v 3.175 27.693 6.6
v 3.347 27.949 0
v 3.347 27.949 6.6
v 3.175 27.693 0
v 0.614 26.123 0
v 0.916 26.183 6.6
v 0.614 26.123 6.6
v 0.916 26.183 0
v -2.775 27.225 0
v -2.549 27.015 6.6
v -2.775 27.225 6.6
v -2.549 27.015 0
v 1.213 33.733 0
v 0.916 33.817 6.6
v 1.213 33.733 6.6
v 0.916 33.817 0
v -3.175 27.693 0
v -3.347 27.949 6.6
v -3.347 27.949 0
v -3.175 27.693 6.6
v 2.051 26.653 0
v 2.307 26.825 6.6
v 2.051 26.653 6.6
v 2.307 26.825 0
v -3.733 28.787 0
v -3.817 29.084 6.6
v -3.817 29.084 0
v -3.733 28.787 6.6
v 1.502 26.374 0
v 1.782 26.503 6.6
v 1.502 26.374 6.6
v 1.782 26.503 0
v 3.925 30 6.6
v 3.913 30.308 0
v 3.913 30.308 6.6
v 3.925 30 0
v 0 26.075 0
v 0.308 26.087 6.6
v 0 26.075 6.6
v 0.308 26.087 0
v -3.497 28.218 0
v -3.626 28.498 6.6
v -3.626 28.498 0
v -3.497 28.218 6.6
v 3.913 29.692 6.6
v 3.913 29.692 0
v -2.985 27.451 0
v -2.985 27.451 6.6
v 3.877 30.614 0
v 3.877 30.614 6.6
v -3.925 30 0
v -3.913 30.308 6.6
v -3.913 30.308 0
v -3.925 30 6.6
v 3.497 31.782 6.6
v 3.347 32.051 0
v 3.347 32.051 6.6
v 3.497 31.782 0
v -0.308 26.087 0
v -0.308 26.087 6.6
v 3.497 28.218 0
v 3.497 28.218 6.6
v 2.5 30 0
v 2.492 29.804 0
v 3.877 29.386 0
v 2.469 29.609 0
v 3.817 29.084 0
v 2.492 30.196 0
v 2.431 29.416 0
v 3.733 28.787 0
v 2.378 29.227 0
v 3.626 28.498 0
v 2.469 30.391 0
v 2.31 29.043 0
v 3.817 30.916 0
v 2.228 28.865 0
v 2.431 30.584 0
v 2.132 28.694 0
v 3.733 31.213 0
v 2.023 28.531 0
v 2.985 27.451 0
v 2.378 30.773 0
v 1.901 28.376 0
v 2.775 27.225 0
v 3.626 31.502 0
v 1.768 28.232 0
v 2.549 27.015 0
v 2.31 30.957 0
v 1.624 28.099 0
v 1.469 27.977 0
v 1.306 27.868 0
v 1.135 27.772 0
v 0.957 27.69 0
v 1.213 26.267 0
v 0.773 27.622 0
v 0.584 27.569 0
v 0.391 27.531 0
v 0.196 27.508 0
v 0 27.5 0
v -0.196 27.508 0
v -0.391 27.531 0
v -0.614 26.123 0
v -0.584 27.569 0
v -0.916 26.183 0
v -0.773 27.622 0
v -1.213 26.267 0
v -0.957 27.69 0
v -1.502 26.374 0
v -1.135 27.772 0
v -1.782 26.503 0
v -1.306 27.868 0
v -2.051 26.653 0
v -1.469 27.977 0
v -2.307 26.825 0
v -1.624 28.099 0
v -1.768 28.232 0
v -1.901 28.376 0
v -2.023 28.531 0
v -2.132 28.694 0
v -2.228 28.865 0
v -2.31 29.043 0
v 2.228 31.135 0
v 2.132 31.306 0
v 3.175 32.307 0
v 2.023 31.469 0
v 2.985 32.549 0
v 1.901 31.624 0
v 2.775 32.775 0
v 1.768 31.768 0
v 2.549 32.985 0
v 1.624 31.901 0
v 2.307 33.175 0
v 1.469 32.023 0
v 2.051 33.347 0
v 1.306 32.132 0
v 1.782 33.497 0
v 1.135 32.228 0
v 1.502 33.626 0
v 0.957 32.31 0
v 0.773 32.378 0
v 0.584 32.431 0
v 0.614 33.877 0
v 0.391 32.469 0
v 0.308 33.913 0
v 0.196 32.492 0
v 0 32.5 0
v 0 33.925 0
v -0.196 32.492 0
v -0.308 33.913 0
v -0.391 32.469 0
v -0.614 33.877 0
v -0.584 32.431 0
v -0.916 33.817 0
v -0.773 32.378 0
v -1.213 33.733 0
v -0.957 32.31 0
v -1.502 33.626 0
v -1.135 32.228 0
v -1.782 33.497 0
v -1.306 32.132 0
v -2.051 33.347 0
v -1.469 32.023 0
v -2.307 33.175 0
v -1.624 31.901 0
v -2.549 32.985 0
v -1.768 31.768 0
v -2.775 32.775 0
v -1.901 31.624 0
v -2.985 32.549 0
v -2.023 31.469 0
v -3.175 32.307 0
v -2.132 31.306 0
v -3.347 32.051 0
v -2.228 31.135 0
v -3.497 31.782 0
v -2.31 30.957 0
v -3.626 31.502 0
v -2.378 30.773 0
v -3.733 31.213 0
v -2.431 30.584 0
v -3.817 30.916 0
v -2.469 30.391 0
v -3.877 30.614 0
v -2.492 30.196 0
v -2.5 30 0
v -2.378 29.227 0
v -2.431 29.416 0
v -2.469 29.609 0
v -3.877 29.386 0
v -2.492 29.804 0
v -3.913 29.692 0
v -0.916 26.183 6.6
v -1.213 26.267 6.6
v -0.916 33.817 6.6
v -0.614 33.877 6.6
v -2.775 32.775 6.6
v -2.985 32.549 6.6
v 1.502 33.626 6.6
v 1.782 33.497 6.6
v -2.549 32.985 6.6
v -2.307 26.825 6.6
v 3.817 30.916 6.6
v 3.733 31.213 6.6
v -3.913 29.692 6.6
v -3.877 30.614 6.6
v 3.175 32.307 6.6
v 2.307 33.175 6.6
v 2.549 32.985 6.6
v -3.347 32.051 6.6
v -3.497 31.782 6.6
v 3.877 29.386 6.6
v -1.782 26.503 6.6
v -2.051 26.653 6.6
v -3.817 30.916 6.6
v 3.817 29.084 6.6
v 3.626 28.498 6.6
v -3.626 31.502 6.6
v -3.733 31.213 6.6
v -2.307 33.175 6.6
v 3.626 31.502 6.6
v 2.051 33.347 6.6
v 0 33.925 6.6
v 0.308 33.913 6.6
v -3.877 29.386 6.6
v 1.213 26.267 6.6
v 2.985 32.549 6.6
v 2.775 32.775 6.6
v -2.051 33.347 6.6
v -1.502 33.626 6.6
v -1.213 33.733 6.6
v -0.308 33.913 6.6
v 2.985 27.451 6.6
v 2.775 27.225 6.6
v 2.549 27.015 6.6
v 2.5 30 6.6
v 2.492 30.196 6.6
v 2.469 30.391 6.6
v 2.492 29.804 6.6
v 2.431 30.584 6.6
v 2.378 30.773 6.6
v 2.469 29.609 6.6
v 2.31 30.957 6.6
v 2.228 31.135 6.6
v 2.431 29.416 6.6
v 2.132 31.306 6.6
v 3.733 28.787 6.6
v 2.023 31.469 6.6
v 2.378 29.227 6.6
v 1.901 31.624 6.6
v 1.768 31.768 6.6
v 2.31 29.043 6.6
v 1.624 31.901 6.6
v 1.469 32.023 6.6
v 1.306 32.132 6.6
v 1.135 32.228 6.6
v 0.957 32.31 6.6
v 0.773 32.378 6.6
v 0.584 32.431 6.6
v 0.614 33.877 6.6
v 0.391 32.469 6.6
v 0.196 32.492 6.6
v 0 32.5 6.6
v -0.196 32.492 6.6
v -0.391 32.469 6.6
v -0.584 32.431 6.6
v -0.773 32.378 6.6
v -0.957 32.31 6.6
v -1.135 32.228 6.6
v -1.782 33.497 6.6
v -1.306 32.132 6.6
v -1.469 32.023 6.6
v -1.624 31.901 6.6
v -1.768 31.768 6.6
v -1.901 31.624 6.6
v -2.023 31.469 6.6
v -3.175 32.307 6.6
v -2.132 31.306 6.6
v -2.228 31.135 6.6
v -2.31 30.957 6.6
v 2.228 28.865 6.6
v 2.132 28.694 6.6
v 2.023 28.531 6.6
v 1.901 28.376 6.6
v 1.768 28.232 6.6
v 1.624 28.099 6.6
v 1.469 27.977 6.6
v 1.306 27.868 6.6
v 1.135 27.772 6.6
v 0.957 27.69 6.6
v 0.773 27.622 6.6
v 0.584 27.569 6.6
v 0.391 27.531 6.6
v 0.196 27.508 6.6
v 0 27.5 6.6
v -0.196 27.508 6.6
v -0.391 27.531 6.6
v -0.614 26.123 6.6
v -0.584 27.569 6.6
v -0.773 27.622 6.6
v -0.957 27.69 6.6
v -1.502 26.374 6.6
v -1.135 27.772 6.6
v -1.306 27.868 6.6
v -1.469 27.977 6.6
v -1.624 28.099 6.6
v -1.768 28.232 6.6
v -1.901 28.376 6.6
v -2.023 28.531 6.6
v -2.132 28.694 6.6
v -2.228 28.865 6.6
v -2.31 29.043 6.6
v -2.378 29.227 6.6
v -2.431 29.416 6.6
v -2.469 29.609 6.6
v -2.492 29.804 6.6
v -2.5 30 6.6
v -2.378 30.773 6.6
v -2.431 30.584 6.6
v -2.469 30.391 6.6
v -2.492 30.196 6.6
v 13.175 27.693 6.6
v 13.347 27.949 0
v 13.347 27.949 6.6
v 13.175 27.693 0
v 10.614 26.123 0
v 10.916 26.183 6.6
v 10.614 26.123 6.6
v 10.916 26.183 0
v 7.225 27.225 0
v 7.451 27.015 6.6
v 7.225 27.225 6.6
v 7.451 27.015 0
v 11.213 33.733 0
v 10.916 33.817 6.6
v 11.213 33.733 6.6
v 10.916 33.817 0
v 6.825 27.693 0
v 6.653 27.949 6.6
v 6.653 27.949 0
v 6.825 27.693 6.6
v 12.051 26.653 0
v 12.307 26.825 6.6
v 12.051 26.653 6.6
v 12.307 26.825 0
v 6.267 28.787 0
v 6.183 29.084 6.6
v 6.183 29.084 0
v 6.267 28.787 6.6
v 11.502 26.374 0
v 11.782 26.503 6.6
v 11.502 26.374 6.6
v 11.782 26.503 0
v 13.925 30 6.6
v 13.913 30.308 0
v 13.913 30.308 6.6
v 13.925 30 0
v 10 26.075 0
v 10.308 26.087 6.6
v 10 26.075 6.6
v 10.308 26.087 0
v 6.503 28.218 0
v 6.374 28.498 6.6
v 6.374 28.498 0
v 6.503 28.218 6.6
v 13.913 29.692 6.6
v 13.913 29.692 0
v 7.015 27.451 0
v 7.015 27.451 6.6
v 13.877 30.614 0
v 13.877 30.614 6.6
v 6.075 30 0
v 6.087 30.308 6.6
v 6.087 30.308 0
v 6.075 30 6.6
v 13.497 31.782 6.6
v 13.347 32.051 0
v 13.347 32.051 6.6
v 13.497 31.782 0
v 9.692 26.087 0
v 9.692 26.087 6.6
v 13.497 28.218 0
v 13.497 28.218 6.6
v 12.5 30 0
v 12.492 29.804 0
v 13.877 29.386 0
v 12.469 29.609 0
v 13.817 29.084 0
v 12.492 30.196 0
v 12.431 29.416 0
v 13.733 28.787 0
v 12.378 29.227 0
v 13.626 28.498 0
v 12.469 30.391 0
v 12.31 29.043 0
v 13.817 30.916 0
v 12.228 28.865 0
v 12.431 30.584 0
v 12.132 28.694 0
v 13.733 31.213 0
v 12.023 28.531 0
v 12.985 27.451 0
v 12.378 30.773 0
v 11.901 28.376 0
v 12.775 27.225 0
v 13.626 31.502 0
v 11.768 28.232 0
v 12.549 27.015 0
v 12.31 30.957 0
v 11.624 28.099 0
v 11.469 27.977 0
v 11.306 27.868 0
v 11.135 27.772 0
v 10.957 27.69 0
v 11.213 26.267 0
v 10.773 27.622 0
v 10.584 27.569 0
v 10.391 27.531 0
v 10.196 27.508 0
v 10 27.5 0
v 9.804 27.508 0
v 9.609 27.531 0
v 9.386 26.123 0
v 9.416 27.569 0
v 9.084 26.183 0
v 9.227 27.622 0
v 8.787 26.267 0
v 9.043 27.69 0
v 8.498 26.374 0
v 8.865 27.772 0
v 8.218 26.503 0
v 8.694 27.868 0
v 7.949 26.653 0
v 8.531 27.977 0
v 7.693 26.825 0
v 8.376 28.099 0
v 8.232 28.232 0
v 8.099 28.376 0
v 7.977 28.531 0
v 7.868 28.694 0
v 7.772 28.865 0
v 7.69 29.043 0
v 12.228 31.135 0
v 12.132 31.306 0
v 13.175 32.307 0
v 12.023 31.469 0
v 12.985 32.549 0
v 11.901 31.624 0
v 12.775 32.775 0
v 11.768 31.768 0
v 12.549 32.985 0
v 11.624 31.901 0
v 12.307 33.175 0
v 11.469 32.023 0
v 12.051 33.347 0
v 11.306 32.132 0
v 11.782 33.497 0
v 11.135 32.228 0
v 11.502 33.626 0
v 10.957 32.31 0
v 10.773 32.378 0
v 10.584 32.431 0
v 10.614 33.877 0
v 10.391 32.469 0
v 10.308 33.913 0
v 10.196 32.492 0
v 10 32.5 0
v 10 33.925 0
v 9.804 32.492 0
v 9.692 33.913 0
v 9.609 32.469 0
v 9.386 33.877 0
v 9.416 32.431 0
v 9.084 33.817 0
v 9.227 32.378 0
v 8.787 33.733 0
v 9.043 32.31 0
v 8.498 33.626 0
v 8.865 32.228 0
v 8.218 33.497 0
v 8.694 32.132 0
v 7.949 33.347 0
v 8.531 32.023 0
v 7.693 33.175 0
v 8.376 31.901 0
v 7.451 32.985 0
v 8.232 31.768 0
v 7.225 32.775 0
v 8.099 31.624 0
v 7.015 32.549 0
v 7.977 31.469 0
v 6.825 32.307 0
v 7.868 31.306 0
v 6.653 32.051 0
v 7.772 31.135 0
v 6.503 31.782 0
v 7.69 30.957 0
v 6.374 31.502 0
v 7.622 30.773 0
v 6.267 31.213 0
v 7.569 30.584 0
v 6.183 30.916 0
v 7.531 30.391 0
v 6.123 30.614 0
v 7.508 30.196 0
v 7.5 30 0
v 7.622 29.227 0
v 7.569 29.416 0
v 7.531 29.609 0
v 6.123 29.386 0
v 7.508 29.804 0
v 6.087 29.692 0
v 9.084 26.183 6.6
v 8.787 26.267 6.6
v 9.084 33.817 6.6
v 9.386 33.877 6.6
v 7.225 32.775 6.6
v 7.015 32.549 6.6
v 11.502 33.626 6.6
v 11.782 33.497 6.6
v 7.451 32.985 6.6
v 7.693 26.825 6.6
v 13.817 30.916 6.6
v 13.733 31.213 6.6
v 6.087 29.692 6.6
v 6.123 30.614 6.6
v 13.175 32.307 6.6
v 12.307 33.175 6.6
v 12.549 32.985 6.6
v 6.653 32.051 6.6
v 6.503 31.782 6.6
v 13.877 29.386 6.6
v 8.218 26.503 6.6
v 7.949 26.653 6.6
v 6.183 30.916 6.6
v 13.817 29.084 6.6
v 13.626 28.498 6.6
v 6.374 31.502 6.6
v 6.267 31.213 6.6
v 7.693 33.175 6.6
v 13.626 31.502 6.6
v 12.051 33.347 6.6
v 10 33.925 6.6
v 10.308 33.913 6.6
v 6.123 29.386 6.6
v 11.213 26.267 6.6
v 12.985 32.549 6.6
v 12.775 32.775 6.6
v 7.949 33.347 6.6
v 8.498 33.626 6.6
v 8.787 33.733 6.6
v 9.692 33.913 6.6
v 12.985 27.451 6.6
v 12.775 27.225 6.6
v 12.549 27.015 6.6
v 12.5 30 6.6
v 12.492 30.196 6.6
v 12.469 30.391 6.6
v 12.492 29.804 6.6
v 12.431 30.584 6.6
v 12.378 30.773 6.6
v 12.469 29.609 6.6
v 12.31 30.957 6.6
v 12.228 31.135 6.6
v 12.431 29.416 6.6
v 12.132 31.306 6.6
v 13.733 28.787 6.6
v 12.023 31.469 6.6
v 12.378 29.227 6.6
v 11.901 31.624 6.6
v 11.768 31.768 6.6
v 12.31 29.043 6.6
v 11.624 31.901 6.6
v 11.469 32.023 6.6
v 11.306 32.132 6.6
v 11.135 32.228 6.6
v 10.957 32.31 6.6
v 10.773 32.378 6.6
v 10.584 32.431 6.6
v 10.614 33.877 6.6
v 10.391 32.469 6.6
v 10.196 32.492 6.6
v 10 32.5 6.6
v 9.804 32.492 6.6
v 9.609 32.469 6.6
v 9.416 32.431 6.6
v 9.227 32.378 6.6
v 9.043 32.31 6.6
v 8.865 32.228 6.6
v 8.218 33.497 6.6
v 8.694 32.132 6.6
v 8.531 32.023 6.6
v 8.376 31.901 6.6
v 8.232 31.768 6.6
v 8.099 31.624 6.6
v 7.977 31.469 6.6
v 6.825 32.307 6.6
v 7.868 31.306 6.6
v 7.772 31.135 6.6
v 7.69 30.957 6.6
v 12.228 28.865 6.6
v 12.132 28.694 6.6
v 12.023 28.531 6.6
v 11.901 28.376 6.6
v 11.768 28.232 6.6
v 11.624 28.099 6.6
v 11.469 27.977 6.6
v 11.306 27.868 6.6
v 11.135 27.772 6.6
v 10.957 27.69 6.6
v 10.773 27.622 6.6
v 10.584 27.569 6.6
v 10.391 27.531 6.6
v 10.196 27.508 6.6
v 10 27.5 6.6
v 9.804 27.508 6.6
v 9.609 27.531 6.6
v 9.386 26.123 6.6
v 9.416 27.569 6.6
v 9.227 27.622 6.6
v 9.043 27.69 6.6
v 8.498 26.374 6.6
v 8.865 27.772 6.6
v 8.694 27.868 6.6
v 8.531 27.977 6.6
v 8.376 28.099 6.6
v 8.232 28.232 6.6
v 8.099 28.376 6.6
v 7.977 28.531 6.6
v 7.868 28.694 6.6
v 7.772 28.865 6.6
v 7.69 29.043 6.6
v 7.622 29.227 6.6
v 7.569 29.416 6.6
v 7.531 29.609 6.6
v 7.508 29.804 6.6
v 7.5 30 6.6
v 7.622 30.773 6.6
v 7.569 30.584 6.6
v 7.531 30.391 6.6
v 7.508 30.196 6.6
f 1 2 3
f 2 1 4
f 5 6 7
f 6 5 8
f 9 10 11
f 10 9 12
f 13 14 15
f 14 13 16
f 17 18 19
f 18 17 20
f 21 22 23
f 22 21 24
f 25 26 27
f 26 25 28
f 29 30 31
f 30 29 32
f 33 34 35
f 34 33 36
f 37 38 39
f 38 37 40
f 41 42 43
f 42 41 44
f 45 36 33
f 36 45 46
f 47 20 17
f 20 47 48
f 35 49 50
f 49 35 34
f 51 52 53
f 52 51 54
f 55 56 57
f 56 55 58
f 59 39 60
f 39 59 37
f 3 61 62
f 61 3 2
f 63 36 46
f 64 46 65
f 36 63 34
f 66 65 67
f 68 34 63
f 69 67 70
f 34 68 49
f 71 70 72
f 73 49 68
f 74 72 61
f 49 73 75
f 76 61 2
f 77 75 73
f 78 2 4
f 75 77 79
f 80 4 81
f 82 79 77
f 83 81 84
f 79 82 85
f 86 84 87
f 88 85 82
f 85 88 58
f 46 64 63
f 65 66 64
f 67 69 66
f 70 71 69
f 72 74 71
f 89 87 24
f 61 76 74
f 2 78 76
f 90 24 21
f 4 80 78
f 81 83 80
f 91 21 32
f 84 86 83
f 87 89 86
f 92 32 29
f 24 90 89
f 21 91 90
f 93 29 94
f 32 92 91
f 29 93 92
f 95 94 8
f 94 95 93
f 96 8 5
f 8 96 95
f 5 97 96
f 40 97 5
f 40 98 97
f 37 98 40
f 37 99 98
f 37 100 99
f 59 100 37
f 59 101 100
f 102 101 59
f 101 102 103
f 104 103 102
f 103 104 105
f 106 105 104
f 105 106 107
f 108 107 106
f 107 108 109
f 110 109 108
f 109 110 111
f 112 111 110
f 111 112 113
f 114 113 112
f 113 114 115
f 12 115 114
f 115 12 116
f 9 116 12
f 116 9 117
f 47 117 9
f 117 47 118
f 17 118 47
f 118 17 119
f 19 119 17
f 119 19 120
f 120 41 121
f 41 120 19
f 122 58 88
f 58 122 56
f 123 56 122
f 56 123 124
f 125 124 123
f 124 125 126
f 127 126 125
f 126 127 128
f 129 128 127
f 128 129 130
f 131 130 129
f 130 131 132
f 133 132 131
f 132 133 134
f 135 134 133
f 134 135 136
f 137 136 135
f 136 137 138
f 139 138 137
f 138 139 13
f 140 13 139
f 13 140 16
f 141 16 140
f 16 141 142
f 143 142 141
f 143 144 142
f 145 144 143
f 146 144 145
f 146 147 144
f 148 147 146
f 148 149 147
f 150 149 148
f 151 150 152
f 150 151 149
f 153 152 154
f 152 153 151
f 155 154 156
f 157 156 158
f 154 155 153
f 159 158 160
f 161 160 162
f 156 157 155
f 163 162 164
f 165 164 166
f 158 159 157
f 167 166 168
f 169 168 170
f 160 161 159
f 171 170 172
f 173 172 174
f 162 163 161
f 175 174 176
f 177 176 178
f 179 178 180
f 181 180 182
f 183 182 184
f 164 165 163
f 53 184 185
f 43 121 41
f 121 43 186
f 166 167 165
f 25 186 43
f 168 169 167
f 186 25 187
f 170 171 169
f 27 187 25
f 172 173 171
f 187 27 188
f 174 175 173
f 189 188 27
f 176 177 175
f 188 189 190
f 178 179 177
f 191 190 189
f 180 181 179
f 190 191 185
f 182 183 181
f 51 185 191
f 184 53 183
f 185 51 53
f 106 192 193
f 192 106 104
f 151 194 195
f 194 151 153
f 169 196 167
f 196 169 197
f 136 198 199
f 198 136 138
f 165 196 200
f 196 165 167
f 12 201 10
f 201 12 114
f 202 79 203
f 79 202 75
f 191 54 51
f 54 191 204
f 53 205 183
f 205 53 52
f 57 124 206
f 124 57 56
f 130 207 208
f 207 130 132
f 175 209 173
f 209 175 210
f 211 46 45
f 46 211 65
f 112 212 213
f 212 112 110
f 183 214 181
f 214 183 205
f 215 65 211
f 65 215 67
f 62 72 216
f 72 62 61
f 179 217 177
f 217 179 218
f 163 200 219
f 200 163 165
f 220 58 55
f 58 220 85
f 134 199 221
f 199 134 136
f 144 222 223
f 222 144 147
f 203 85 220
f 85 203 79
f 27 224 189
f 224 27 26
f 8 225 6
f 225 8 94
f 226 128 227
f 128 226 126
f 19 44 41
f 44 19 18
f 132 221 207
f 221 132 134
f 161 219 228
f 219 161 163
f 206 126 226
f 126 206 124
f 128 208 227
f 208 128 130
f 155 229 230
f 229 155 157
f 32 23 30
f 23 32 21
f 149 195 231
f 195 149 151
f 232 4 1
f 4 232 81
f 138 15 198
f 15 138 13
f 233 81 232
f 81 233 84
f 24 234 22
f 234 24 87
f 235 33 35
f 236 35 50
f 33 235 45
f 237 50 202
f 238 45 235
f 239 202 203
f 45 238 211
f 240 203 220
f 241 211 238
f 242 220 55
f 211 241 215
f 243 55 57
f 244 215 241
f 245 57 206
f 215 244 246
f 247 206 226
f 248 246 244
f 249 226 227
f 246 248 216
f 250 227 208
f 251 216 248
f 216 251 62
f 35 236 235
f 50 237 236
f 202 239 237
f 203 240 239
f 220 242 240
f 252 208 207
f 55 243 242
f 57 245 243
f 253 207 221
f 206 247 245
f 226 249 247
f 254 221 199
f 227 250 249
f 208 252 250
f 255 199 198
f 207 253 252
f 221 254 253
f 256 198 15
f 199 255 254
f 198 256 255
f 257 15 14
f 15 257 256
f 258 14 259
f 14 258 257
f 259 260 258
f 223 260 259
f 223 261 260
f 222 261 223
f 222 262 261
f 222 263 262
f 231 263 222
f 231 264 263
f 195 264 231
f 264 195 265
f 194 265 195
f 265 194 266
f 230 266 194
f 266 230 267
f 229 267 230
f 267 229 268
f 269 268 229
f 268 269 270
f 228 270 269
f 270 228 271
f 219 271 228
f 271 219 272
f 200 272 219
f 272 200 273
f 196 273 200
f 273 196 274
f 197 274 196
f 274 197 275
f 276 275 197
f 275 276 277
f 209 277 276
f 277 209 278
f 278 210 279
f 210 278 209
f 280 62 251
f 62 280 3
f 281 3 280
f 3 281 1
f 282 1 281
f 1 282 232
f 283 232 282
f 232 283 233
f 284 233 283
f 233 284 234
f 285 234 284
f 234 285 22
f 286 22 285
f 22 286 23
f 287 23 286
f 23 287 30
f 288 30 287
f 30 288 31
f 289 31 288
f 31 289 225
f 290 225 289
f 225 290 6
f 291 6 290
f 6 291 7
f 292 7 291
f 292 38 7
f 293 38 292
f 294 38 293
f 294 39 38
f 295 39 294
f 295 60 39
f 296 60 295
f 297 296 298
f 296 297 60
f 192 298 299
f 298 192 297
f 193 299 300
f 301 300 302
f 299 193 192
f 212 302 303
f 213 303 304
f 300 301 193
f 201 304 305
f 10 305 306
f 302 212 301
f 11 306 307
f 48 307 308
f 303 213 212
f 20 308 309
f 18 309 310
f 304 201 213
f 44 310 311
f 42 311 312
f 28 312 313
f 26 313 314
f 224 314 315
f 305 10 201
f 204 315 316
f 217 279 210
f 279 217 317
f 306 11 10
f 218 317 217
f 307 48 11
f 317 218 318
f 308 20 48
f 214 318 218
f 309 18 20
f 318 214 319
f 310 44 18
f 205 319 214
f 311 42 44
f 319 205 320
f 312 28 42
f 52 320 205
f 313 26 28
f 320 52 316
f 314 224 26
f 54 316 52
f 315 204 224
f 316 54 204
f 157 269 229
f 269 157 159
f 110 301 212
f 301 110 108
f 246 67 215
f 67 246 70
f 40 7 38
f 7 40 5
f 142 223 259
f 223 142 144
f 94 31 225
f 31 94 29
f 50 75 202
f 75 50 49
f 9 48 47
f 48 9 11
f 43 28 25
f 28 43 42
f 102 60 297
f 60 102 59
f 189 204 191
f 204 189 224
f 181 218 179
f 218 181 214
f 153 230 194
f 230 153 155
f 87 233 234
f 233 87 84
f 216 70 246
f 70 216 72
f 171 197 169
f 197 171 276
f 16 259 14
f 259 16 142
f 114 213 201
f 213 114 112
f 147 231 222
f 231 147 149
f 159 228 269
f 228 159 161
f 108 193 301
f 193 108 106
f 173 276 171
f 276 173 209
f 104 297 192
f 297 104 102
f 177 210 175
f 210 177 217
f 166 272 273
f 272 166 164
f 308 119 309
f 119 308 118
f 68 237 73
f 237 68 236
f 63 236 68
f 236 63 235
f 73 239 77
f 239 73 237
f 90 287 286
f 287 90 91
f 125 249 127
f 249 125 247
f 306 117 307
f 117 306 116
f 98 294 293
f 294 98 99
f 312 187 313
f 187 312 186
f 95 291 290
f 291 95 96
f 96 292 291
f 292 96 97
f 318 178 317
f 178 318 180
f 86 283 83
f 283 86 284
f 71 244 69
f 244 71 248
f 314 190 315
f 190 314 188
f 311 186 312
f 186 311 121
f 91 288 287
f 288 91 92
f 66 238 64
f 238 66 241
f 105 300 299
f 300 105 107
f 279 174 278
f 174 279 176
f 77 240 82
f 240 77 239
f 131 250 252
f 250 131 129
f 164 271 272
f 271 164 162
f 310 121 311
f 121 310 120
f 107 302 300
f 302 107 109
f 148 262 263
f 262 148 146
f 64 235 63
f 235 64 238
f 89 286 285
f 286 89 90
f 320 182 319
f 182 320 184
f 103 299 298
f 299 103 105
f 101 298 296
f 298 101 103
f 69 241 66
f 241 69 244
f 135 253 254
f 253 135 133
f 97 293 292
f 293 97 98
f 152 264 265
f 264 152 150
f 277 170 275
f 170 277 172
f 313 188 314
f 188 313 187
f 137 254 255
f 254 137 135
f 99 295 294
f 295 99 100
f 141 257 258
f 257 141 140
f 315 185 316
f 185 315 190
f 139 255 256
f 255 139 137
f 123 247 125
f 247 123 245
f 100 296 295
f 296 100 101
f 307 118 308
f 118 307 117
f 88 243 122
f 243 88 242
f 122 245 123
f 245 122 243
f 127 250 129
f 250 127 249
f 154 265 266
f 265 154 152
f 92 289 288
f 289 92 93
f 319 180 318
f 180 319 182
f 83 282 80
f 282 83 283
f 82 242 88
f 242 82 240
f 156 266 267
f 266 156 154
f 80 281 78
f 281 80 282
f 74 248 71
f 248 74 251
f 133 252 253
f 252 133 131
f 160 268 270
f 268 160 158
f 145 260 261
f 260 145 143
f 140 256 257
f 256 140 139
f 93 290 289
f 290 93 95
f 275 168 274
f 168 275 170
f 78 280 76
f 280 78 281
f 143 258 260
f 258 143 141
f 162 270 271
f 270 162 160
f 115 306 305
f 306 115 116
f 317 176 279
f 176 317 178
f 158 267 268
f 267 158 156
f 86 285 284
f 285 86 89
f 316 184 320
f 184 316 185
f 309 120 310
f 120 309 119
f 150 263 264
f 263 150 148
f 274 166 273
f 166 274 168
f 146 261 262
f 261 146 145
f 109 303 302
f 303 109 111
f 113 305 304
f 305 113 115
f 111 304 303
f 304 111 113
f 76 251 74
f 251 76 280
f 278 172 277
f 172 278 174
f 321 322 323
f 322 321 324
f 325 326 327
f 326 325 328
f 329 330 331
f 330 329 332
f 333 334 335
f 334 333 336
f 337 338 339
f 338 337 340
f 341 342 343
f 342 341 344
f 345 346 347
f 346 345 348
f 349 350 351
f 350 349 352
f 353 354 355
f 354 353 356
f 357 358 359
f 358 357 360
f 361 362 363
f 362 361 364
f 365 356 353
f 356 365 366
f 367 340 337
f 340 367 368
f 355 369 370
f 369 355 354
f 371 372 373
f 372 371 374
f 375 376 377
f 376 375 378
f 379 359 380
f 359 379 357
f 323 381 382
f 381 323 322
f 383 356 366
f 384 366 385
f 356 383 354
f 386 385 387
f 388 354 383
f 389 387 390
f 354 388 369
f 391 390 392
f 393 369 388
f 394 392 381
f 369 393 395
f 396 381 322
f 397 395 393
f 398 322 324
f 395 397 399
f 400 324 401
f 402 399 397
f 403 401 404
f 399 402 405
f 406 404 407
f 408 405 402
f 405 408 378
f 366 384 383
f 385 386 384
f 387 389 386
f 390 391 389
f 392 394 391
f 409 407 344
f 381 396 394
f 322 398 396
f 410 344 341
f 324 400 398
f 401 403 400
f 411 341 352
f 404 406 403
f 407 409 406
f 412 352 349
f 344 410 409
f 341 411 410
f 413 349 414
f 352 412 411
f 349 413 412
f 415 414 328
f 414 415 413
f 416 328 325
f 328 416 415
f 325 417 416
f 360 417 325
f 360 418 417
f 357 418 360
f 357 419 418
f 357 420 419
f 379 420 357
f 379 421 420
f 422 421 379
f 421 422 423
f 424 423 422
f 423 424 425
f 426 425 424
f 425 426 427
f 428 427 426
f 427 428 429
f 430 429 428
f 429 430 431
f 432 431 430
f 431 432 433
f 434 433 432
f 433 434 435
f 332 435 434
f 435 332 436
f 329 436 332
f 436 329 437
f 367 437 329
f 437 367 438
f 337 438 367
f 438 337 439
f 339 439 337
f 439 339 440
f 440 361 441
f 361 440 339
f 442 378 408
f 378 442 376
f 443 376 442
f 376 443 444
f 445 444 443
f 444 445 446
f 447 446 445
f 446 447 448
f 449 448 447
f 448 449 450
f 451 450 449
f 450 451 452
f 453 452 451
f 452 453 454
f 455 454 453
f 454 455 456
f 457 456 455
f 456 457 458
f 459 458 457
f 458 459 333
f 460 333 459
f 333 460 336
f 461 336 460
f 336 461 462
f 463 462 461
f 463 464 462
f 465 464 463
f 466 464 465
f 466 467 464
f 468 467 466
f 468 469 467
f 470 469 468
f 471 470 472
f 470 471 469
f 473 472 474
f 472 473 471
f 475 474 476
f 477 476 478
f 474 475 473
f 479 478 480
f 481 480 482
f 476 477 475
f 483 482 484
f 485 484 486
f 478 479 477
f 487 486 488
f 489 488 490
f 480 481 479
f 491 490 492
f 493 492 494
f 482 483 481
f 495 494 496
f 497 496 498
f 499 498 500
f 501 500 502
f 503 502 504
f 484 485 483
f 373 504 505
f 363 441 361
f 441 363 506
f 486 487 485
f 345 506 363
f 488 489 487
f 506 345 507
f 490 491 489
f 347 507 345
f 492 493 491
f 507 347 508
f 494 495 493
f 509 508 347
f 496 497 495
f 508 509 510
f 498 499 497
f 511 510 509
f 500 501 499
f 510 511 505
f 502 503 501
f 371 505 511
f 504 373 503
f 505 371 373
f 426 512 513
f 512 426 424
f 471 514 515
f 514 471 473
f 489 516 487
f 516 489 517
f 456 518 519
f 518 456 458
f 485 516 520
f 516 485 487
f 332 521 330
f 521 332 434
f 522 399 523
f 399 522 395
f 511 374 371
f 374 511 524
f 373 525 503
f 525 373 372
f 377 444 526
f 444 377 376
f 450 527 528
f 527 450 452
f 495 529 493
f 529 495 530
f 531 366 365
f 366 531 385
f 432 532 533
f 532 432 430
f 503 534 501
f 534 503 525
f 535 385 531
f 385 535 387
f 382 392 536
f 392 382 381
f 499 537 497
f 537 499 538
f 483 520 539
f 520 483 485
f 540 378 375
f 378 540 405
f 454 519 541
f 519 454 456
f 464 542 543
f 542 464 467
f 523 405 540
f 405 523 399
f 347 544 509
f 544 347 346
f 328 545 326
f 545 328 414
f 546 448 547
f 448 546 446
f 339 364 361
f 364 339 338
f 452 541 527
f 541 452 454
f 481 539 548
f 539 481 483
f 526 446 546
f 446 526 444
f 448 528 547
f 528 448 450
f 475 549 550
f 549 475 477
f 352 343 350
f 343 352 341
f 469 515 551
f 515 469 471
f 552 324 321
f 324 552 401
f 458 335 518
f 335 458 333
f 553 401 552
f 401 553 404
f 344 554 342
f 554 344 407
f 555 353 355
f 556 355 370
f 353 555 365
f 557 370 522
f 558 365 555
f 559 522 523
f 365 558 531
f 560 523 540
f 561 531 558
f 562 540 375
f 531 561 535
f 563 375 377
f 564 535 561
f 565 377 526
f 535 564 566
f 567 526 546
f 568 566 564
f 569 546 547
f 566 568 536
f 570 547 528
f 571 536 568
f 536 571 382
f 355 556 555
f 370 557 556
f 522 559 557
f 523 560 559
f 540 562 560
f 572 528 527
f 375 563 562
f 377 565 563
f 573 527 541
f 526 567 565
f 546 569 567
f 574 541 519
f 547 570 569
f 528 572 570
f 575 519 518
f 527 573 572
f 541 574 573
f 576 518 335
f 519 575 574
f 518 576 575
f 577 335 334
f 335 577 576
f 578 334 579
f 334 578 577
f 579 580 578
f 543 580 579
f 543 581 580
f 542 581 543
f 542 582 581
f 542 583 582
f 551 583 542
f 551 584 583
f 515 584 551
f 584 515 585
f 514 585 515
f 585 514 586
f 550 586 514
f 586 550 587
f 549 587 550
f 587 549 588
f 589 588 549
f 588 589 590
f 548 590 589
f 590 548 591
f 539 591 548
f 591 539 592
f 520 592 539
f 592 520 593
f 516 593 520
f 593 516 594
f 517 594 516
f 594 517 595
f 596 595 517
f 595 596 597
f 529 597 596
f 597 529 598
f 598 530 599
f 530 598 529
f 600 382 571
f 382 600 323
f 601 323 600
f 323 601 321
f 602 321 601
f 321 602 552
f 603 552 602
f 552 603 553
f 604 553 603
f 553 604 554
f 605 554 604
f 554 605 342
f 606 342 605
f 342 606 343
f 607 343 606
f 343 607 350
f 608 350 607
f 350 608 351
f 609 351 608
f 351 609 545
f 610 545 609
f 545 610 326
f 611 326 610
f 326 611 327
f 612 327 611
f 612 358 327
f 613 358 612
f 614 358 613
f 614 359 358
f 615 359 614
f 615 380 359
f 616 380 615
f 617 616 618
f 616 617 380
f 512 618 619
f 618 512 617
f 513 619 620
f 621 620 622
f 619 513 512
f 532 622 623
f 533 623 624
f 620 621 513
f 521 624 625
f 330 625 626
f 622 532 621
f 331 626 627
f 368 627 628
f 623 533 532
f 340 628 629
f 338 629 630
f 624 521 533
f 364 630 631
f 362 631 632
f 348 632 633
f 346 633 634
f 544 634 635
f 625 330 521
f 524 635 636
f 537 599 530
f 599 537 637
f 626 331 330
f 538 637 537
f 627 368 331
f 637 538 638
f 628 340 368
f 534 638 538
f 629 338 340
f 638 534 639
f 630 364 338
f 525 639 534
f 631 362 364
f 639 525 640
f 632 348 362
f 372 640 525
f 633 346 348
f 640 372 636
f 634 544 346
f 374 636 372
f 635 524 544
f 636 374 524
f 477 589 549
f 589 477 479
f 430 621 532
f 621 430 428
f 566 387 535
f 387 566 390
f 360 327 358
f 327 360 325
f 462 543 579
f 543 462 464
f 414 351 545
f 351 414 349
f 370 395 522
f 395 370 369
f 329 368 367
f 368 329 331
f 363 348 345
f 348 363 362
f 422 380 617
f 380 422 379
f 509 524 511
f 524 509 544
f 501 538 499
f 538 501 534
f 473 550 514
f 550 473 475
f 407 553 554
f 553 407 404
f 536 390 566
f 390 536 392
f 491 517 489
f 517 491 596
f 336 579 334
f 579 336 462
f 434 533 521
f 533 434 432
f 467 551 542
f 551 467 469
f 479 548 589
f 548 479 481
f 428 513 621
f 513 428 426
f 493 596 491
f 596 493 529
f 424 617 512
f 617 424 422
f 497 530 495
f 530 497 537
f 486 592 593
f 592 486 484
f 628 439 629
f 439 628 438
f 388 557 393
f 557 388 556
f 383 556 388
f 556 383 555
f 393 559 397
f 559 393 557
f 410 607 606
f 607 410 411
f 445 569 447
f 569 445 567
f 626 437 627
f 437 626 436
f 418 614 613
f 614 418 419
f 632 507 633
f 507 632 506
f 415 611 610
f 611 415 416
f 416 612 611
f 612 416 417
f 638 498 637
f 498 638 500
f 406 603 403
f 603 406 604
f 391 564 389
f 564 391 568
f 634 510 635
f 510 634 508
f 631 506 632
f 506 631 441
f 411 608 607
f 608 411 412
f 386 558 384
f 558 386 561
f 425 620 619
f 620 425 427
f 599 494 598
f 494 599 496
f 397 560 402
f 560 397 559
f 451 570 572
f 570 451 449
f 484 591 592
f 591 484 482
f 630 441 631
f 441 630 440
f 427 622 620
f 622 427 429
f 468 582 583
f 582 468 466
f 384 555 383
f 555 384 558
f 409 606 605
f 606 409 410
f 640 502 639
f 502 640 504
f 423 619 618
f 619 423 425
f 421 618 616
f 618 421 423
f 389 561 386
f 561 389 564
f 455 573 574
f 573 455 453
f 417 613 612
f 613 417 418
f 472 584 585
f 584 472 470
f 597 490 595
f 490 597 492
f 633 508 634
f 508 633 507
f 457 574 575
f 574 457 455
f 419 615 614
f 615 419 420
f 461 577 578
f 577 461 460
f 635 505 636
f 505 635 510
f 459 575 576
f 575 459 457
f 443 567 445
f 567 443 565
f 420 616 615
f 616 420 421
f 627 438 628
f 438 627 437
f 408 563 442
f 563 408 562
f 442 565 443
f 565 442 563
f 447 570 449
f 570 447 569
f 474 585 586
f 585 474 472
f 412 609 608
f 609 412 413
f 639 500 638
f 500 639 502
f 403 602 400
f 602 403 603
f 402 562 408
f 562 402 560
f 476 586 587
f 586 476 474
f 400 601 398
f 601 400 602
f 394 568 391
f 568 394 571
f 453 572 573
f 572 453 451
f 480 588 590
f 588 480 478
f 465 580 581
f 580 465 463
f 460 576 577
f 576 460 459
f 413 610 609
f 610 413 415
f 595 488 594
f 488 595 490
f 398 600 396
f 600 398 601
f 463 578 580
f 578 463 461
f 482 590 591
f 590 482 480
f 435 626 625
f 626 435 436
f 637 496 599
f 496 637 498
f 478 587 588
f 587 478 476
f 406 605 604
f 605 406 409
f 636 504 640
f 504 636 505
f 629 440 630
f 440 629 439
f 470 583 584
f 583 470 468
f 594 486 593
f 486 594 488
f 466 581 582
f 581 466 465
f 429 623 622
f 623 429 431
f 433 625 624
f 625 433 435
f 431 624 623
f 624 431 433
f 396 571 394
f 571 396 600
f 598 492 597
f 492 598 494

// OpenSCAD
$fn=80;
/*difference()
{
	hull()
	{
		cylinder(d=24, h=4);
		translate([106, 0, 0]) cylinder(d=24, h=4);
	}
	translate([0, 0, -1]) cylinder(d=20.25, h=6);
	translate([106, 0, -1]) cylinder(d=20.25, h=6);
}*/

translate([0, 30, 0]) difference()
{
    cylinder(d=7.85, h=6.6);
    translate([0, 0, -1]) cylinder(d=5, h=10);
}
translate([10, 30, 0]) difference()
{
    cylinder(d=7.85, h=6.6);
    translate([0, 0, -1]) cylinder(d=5, h=10);
}
